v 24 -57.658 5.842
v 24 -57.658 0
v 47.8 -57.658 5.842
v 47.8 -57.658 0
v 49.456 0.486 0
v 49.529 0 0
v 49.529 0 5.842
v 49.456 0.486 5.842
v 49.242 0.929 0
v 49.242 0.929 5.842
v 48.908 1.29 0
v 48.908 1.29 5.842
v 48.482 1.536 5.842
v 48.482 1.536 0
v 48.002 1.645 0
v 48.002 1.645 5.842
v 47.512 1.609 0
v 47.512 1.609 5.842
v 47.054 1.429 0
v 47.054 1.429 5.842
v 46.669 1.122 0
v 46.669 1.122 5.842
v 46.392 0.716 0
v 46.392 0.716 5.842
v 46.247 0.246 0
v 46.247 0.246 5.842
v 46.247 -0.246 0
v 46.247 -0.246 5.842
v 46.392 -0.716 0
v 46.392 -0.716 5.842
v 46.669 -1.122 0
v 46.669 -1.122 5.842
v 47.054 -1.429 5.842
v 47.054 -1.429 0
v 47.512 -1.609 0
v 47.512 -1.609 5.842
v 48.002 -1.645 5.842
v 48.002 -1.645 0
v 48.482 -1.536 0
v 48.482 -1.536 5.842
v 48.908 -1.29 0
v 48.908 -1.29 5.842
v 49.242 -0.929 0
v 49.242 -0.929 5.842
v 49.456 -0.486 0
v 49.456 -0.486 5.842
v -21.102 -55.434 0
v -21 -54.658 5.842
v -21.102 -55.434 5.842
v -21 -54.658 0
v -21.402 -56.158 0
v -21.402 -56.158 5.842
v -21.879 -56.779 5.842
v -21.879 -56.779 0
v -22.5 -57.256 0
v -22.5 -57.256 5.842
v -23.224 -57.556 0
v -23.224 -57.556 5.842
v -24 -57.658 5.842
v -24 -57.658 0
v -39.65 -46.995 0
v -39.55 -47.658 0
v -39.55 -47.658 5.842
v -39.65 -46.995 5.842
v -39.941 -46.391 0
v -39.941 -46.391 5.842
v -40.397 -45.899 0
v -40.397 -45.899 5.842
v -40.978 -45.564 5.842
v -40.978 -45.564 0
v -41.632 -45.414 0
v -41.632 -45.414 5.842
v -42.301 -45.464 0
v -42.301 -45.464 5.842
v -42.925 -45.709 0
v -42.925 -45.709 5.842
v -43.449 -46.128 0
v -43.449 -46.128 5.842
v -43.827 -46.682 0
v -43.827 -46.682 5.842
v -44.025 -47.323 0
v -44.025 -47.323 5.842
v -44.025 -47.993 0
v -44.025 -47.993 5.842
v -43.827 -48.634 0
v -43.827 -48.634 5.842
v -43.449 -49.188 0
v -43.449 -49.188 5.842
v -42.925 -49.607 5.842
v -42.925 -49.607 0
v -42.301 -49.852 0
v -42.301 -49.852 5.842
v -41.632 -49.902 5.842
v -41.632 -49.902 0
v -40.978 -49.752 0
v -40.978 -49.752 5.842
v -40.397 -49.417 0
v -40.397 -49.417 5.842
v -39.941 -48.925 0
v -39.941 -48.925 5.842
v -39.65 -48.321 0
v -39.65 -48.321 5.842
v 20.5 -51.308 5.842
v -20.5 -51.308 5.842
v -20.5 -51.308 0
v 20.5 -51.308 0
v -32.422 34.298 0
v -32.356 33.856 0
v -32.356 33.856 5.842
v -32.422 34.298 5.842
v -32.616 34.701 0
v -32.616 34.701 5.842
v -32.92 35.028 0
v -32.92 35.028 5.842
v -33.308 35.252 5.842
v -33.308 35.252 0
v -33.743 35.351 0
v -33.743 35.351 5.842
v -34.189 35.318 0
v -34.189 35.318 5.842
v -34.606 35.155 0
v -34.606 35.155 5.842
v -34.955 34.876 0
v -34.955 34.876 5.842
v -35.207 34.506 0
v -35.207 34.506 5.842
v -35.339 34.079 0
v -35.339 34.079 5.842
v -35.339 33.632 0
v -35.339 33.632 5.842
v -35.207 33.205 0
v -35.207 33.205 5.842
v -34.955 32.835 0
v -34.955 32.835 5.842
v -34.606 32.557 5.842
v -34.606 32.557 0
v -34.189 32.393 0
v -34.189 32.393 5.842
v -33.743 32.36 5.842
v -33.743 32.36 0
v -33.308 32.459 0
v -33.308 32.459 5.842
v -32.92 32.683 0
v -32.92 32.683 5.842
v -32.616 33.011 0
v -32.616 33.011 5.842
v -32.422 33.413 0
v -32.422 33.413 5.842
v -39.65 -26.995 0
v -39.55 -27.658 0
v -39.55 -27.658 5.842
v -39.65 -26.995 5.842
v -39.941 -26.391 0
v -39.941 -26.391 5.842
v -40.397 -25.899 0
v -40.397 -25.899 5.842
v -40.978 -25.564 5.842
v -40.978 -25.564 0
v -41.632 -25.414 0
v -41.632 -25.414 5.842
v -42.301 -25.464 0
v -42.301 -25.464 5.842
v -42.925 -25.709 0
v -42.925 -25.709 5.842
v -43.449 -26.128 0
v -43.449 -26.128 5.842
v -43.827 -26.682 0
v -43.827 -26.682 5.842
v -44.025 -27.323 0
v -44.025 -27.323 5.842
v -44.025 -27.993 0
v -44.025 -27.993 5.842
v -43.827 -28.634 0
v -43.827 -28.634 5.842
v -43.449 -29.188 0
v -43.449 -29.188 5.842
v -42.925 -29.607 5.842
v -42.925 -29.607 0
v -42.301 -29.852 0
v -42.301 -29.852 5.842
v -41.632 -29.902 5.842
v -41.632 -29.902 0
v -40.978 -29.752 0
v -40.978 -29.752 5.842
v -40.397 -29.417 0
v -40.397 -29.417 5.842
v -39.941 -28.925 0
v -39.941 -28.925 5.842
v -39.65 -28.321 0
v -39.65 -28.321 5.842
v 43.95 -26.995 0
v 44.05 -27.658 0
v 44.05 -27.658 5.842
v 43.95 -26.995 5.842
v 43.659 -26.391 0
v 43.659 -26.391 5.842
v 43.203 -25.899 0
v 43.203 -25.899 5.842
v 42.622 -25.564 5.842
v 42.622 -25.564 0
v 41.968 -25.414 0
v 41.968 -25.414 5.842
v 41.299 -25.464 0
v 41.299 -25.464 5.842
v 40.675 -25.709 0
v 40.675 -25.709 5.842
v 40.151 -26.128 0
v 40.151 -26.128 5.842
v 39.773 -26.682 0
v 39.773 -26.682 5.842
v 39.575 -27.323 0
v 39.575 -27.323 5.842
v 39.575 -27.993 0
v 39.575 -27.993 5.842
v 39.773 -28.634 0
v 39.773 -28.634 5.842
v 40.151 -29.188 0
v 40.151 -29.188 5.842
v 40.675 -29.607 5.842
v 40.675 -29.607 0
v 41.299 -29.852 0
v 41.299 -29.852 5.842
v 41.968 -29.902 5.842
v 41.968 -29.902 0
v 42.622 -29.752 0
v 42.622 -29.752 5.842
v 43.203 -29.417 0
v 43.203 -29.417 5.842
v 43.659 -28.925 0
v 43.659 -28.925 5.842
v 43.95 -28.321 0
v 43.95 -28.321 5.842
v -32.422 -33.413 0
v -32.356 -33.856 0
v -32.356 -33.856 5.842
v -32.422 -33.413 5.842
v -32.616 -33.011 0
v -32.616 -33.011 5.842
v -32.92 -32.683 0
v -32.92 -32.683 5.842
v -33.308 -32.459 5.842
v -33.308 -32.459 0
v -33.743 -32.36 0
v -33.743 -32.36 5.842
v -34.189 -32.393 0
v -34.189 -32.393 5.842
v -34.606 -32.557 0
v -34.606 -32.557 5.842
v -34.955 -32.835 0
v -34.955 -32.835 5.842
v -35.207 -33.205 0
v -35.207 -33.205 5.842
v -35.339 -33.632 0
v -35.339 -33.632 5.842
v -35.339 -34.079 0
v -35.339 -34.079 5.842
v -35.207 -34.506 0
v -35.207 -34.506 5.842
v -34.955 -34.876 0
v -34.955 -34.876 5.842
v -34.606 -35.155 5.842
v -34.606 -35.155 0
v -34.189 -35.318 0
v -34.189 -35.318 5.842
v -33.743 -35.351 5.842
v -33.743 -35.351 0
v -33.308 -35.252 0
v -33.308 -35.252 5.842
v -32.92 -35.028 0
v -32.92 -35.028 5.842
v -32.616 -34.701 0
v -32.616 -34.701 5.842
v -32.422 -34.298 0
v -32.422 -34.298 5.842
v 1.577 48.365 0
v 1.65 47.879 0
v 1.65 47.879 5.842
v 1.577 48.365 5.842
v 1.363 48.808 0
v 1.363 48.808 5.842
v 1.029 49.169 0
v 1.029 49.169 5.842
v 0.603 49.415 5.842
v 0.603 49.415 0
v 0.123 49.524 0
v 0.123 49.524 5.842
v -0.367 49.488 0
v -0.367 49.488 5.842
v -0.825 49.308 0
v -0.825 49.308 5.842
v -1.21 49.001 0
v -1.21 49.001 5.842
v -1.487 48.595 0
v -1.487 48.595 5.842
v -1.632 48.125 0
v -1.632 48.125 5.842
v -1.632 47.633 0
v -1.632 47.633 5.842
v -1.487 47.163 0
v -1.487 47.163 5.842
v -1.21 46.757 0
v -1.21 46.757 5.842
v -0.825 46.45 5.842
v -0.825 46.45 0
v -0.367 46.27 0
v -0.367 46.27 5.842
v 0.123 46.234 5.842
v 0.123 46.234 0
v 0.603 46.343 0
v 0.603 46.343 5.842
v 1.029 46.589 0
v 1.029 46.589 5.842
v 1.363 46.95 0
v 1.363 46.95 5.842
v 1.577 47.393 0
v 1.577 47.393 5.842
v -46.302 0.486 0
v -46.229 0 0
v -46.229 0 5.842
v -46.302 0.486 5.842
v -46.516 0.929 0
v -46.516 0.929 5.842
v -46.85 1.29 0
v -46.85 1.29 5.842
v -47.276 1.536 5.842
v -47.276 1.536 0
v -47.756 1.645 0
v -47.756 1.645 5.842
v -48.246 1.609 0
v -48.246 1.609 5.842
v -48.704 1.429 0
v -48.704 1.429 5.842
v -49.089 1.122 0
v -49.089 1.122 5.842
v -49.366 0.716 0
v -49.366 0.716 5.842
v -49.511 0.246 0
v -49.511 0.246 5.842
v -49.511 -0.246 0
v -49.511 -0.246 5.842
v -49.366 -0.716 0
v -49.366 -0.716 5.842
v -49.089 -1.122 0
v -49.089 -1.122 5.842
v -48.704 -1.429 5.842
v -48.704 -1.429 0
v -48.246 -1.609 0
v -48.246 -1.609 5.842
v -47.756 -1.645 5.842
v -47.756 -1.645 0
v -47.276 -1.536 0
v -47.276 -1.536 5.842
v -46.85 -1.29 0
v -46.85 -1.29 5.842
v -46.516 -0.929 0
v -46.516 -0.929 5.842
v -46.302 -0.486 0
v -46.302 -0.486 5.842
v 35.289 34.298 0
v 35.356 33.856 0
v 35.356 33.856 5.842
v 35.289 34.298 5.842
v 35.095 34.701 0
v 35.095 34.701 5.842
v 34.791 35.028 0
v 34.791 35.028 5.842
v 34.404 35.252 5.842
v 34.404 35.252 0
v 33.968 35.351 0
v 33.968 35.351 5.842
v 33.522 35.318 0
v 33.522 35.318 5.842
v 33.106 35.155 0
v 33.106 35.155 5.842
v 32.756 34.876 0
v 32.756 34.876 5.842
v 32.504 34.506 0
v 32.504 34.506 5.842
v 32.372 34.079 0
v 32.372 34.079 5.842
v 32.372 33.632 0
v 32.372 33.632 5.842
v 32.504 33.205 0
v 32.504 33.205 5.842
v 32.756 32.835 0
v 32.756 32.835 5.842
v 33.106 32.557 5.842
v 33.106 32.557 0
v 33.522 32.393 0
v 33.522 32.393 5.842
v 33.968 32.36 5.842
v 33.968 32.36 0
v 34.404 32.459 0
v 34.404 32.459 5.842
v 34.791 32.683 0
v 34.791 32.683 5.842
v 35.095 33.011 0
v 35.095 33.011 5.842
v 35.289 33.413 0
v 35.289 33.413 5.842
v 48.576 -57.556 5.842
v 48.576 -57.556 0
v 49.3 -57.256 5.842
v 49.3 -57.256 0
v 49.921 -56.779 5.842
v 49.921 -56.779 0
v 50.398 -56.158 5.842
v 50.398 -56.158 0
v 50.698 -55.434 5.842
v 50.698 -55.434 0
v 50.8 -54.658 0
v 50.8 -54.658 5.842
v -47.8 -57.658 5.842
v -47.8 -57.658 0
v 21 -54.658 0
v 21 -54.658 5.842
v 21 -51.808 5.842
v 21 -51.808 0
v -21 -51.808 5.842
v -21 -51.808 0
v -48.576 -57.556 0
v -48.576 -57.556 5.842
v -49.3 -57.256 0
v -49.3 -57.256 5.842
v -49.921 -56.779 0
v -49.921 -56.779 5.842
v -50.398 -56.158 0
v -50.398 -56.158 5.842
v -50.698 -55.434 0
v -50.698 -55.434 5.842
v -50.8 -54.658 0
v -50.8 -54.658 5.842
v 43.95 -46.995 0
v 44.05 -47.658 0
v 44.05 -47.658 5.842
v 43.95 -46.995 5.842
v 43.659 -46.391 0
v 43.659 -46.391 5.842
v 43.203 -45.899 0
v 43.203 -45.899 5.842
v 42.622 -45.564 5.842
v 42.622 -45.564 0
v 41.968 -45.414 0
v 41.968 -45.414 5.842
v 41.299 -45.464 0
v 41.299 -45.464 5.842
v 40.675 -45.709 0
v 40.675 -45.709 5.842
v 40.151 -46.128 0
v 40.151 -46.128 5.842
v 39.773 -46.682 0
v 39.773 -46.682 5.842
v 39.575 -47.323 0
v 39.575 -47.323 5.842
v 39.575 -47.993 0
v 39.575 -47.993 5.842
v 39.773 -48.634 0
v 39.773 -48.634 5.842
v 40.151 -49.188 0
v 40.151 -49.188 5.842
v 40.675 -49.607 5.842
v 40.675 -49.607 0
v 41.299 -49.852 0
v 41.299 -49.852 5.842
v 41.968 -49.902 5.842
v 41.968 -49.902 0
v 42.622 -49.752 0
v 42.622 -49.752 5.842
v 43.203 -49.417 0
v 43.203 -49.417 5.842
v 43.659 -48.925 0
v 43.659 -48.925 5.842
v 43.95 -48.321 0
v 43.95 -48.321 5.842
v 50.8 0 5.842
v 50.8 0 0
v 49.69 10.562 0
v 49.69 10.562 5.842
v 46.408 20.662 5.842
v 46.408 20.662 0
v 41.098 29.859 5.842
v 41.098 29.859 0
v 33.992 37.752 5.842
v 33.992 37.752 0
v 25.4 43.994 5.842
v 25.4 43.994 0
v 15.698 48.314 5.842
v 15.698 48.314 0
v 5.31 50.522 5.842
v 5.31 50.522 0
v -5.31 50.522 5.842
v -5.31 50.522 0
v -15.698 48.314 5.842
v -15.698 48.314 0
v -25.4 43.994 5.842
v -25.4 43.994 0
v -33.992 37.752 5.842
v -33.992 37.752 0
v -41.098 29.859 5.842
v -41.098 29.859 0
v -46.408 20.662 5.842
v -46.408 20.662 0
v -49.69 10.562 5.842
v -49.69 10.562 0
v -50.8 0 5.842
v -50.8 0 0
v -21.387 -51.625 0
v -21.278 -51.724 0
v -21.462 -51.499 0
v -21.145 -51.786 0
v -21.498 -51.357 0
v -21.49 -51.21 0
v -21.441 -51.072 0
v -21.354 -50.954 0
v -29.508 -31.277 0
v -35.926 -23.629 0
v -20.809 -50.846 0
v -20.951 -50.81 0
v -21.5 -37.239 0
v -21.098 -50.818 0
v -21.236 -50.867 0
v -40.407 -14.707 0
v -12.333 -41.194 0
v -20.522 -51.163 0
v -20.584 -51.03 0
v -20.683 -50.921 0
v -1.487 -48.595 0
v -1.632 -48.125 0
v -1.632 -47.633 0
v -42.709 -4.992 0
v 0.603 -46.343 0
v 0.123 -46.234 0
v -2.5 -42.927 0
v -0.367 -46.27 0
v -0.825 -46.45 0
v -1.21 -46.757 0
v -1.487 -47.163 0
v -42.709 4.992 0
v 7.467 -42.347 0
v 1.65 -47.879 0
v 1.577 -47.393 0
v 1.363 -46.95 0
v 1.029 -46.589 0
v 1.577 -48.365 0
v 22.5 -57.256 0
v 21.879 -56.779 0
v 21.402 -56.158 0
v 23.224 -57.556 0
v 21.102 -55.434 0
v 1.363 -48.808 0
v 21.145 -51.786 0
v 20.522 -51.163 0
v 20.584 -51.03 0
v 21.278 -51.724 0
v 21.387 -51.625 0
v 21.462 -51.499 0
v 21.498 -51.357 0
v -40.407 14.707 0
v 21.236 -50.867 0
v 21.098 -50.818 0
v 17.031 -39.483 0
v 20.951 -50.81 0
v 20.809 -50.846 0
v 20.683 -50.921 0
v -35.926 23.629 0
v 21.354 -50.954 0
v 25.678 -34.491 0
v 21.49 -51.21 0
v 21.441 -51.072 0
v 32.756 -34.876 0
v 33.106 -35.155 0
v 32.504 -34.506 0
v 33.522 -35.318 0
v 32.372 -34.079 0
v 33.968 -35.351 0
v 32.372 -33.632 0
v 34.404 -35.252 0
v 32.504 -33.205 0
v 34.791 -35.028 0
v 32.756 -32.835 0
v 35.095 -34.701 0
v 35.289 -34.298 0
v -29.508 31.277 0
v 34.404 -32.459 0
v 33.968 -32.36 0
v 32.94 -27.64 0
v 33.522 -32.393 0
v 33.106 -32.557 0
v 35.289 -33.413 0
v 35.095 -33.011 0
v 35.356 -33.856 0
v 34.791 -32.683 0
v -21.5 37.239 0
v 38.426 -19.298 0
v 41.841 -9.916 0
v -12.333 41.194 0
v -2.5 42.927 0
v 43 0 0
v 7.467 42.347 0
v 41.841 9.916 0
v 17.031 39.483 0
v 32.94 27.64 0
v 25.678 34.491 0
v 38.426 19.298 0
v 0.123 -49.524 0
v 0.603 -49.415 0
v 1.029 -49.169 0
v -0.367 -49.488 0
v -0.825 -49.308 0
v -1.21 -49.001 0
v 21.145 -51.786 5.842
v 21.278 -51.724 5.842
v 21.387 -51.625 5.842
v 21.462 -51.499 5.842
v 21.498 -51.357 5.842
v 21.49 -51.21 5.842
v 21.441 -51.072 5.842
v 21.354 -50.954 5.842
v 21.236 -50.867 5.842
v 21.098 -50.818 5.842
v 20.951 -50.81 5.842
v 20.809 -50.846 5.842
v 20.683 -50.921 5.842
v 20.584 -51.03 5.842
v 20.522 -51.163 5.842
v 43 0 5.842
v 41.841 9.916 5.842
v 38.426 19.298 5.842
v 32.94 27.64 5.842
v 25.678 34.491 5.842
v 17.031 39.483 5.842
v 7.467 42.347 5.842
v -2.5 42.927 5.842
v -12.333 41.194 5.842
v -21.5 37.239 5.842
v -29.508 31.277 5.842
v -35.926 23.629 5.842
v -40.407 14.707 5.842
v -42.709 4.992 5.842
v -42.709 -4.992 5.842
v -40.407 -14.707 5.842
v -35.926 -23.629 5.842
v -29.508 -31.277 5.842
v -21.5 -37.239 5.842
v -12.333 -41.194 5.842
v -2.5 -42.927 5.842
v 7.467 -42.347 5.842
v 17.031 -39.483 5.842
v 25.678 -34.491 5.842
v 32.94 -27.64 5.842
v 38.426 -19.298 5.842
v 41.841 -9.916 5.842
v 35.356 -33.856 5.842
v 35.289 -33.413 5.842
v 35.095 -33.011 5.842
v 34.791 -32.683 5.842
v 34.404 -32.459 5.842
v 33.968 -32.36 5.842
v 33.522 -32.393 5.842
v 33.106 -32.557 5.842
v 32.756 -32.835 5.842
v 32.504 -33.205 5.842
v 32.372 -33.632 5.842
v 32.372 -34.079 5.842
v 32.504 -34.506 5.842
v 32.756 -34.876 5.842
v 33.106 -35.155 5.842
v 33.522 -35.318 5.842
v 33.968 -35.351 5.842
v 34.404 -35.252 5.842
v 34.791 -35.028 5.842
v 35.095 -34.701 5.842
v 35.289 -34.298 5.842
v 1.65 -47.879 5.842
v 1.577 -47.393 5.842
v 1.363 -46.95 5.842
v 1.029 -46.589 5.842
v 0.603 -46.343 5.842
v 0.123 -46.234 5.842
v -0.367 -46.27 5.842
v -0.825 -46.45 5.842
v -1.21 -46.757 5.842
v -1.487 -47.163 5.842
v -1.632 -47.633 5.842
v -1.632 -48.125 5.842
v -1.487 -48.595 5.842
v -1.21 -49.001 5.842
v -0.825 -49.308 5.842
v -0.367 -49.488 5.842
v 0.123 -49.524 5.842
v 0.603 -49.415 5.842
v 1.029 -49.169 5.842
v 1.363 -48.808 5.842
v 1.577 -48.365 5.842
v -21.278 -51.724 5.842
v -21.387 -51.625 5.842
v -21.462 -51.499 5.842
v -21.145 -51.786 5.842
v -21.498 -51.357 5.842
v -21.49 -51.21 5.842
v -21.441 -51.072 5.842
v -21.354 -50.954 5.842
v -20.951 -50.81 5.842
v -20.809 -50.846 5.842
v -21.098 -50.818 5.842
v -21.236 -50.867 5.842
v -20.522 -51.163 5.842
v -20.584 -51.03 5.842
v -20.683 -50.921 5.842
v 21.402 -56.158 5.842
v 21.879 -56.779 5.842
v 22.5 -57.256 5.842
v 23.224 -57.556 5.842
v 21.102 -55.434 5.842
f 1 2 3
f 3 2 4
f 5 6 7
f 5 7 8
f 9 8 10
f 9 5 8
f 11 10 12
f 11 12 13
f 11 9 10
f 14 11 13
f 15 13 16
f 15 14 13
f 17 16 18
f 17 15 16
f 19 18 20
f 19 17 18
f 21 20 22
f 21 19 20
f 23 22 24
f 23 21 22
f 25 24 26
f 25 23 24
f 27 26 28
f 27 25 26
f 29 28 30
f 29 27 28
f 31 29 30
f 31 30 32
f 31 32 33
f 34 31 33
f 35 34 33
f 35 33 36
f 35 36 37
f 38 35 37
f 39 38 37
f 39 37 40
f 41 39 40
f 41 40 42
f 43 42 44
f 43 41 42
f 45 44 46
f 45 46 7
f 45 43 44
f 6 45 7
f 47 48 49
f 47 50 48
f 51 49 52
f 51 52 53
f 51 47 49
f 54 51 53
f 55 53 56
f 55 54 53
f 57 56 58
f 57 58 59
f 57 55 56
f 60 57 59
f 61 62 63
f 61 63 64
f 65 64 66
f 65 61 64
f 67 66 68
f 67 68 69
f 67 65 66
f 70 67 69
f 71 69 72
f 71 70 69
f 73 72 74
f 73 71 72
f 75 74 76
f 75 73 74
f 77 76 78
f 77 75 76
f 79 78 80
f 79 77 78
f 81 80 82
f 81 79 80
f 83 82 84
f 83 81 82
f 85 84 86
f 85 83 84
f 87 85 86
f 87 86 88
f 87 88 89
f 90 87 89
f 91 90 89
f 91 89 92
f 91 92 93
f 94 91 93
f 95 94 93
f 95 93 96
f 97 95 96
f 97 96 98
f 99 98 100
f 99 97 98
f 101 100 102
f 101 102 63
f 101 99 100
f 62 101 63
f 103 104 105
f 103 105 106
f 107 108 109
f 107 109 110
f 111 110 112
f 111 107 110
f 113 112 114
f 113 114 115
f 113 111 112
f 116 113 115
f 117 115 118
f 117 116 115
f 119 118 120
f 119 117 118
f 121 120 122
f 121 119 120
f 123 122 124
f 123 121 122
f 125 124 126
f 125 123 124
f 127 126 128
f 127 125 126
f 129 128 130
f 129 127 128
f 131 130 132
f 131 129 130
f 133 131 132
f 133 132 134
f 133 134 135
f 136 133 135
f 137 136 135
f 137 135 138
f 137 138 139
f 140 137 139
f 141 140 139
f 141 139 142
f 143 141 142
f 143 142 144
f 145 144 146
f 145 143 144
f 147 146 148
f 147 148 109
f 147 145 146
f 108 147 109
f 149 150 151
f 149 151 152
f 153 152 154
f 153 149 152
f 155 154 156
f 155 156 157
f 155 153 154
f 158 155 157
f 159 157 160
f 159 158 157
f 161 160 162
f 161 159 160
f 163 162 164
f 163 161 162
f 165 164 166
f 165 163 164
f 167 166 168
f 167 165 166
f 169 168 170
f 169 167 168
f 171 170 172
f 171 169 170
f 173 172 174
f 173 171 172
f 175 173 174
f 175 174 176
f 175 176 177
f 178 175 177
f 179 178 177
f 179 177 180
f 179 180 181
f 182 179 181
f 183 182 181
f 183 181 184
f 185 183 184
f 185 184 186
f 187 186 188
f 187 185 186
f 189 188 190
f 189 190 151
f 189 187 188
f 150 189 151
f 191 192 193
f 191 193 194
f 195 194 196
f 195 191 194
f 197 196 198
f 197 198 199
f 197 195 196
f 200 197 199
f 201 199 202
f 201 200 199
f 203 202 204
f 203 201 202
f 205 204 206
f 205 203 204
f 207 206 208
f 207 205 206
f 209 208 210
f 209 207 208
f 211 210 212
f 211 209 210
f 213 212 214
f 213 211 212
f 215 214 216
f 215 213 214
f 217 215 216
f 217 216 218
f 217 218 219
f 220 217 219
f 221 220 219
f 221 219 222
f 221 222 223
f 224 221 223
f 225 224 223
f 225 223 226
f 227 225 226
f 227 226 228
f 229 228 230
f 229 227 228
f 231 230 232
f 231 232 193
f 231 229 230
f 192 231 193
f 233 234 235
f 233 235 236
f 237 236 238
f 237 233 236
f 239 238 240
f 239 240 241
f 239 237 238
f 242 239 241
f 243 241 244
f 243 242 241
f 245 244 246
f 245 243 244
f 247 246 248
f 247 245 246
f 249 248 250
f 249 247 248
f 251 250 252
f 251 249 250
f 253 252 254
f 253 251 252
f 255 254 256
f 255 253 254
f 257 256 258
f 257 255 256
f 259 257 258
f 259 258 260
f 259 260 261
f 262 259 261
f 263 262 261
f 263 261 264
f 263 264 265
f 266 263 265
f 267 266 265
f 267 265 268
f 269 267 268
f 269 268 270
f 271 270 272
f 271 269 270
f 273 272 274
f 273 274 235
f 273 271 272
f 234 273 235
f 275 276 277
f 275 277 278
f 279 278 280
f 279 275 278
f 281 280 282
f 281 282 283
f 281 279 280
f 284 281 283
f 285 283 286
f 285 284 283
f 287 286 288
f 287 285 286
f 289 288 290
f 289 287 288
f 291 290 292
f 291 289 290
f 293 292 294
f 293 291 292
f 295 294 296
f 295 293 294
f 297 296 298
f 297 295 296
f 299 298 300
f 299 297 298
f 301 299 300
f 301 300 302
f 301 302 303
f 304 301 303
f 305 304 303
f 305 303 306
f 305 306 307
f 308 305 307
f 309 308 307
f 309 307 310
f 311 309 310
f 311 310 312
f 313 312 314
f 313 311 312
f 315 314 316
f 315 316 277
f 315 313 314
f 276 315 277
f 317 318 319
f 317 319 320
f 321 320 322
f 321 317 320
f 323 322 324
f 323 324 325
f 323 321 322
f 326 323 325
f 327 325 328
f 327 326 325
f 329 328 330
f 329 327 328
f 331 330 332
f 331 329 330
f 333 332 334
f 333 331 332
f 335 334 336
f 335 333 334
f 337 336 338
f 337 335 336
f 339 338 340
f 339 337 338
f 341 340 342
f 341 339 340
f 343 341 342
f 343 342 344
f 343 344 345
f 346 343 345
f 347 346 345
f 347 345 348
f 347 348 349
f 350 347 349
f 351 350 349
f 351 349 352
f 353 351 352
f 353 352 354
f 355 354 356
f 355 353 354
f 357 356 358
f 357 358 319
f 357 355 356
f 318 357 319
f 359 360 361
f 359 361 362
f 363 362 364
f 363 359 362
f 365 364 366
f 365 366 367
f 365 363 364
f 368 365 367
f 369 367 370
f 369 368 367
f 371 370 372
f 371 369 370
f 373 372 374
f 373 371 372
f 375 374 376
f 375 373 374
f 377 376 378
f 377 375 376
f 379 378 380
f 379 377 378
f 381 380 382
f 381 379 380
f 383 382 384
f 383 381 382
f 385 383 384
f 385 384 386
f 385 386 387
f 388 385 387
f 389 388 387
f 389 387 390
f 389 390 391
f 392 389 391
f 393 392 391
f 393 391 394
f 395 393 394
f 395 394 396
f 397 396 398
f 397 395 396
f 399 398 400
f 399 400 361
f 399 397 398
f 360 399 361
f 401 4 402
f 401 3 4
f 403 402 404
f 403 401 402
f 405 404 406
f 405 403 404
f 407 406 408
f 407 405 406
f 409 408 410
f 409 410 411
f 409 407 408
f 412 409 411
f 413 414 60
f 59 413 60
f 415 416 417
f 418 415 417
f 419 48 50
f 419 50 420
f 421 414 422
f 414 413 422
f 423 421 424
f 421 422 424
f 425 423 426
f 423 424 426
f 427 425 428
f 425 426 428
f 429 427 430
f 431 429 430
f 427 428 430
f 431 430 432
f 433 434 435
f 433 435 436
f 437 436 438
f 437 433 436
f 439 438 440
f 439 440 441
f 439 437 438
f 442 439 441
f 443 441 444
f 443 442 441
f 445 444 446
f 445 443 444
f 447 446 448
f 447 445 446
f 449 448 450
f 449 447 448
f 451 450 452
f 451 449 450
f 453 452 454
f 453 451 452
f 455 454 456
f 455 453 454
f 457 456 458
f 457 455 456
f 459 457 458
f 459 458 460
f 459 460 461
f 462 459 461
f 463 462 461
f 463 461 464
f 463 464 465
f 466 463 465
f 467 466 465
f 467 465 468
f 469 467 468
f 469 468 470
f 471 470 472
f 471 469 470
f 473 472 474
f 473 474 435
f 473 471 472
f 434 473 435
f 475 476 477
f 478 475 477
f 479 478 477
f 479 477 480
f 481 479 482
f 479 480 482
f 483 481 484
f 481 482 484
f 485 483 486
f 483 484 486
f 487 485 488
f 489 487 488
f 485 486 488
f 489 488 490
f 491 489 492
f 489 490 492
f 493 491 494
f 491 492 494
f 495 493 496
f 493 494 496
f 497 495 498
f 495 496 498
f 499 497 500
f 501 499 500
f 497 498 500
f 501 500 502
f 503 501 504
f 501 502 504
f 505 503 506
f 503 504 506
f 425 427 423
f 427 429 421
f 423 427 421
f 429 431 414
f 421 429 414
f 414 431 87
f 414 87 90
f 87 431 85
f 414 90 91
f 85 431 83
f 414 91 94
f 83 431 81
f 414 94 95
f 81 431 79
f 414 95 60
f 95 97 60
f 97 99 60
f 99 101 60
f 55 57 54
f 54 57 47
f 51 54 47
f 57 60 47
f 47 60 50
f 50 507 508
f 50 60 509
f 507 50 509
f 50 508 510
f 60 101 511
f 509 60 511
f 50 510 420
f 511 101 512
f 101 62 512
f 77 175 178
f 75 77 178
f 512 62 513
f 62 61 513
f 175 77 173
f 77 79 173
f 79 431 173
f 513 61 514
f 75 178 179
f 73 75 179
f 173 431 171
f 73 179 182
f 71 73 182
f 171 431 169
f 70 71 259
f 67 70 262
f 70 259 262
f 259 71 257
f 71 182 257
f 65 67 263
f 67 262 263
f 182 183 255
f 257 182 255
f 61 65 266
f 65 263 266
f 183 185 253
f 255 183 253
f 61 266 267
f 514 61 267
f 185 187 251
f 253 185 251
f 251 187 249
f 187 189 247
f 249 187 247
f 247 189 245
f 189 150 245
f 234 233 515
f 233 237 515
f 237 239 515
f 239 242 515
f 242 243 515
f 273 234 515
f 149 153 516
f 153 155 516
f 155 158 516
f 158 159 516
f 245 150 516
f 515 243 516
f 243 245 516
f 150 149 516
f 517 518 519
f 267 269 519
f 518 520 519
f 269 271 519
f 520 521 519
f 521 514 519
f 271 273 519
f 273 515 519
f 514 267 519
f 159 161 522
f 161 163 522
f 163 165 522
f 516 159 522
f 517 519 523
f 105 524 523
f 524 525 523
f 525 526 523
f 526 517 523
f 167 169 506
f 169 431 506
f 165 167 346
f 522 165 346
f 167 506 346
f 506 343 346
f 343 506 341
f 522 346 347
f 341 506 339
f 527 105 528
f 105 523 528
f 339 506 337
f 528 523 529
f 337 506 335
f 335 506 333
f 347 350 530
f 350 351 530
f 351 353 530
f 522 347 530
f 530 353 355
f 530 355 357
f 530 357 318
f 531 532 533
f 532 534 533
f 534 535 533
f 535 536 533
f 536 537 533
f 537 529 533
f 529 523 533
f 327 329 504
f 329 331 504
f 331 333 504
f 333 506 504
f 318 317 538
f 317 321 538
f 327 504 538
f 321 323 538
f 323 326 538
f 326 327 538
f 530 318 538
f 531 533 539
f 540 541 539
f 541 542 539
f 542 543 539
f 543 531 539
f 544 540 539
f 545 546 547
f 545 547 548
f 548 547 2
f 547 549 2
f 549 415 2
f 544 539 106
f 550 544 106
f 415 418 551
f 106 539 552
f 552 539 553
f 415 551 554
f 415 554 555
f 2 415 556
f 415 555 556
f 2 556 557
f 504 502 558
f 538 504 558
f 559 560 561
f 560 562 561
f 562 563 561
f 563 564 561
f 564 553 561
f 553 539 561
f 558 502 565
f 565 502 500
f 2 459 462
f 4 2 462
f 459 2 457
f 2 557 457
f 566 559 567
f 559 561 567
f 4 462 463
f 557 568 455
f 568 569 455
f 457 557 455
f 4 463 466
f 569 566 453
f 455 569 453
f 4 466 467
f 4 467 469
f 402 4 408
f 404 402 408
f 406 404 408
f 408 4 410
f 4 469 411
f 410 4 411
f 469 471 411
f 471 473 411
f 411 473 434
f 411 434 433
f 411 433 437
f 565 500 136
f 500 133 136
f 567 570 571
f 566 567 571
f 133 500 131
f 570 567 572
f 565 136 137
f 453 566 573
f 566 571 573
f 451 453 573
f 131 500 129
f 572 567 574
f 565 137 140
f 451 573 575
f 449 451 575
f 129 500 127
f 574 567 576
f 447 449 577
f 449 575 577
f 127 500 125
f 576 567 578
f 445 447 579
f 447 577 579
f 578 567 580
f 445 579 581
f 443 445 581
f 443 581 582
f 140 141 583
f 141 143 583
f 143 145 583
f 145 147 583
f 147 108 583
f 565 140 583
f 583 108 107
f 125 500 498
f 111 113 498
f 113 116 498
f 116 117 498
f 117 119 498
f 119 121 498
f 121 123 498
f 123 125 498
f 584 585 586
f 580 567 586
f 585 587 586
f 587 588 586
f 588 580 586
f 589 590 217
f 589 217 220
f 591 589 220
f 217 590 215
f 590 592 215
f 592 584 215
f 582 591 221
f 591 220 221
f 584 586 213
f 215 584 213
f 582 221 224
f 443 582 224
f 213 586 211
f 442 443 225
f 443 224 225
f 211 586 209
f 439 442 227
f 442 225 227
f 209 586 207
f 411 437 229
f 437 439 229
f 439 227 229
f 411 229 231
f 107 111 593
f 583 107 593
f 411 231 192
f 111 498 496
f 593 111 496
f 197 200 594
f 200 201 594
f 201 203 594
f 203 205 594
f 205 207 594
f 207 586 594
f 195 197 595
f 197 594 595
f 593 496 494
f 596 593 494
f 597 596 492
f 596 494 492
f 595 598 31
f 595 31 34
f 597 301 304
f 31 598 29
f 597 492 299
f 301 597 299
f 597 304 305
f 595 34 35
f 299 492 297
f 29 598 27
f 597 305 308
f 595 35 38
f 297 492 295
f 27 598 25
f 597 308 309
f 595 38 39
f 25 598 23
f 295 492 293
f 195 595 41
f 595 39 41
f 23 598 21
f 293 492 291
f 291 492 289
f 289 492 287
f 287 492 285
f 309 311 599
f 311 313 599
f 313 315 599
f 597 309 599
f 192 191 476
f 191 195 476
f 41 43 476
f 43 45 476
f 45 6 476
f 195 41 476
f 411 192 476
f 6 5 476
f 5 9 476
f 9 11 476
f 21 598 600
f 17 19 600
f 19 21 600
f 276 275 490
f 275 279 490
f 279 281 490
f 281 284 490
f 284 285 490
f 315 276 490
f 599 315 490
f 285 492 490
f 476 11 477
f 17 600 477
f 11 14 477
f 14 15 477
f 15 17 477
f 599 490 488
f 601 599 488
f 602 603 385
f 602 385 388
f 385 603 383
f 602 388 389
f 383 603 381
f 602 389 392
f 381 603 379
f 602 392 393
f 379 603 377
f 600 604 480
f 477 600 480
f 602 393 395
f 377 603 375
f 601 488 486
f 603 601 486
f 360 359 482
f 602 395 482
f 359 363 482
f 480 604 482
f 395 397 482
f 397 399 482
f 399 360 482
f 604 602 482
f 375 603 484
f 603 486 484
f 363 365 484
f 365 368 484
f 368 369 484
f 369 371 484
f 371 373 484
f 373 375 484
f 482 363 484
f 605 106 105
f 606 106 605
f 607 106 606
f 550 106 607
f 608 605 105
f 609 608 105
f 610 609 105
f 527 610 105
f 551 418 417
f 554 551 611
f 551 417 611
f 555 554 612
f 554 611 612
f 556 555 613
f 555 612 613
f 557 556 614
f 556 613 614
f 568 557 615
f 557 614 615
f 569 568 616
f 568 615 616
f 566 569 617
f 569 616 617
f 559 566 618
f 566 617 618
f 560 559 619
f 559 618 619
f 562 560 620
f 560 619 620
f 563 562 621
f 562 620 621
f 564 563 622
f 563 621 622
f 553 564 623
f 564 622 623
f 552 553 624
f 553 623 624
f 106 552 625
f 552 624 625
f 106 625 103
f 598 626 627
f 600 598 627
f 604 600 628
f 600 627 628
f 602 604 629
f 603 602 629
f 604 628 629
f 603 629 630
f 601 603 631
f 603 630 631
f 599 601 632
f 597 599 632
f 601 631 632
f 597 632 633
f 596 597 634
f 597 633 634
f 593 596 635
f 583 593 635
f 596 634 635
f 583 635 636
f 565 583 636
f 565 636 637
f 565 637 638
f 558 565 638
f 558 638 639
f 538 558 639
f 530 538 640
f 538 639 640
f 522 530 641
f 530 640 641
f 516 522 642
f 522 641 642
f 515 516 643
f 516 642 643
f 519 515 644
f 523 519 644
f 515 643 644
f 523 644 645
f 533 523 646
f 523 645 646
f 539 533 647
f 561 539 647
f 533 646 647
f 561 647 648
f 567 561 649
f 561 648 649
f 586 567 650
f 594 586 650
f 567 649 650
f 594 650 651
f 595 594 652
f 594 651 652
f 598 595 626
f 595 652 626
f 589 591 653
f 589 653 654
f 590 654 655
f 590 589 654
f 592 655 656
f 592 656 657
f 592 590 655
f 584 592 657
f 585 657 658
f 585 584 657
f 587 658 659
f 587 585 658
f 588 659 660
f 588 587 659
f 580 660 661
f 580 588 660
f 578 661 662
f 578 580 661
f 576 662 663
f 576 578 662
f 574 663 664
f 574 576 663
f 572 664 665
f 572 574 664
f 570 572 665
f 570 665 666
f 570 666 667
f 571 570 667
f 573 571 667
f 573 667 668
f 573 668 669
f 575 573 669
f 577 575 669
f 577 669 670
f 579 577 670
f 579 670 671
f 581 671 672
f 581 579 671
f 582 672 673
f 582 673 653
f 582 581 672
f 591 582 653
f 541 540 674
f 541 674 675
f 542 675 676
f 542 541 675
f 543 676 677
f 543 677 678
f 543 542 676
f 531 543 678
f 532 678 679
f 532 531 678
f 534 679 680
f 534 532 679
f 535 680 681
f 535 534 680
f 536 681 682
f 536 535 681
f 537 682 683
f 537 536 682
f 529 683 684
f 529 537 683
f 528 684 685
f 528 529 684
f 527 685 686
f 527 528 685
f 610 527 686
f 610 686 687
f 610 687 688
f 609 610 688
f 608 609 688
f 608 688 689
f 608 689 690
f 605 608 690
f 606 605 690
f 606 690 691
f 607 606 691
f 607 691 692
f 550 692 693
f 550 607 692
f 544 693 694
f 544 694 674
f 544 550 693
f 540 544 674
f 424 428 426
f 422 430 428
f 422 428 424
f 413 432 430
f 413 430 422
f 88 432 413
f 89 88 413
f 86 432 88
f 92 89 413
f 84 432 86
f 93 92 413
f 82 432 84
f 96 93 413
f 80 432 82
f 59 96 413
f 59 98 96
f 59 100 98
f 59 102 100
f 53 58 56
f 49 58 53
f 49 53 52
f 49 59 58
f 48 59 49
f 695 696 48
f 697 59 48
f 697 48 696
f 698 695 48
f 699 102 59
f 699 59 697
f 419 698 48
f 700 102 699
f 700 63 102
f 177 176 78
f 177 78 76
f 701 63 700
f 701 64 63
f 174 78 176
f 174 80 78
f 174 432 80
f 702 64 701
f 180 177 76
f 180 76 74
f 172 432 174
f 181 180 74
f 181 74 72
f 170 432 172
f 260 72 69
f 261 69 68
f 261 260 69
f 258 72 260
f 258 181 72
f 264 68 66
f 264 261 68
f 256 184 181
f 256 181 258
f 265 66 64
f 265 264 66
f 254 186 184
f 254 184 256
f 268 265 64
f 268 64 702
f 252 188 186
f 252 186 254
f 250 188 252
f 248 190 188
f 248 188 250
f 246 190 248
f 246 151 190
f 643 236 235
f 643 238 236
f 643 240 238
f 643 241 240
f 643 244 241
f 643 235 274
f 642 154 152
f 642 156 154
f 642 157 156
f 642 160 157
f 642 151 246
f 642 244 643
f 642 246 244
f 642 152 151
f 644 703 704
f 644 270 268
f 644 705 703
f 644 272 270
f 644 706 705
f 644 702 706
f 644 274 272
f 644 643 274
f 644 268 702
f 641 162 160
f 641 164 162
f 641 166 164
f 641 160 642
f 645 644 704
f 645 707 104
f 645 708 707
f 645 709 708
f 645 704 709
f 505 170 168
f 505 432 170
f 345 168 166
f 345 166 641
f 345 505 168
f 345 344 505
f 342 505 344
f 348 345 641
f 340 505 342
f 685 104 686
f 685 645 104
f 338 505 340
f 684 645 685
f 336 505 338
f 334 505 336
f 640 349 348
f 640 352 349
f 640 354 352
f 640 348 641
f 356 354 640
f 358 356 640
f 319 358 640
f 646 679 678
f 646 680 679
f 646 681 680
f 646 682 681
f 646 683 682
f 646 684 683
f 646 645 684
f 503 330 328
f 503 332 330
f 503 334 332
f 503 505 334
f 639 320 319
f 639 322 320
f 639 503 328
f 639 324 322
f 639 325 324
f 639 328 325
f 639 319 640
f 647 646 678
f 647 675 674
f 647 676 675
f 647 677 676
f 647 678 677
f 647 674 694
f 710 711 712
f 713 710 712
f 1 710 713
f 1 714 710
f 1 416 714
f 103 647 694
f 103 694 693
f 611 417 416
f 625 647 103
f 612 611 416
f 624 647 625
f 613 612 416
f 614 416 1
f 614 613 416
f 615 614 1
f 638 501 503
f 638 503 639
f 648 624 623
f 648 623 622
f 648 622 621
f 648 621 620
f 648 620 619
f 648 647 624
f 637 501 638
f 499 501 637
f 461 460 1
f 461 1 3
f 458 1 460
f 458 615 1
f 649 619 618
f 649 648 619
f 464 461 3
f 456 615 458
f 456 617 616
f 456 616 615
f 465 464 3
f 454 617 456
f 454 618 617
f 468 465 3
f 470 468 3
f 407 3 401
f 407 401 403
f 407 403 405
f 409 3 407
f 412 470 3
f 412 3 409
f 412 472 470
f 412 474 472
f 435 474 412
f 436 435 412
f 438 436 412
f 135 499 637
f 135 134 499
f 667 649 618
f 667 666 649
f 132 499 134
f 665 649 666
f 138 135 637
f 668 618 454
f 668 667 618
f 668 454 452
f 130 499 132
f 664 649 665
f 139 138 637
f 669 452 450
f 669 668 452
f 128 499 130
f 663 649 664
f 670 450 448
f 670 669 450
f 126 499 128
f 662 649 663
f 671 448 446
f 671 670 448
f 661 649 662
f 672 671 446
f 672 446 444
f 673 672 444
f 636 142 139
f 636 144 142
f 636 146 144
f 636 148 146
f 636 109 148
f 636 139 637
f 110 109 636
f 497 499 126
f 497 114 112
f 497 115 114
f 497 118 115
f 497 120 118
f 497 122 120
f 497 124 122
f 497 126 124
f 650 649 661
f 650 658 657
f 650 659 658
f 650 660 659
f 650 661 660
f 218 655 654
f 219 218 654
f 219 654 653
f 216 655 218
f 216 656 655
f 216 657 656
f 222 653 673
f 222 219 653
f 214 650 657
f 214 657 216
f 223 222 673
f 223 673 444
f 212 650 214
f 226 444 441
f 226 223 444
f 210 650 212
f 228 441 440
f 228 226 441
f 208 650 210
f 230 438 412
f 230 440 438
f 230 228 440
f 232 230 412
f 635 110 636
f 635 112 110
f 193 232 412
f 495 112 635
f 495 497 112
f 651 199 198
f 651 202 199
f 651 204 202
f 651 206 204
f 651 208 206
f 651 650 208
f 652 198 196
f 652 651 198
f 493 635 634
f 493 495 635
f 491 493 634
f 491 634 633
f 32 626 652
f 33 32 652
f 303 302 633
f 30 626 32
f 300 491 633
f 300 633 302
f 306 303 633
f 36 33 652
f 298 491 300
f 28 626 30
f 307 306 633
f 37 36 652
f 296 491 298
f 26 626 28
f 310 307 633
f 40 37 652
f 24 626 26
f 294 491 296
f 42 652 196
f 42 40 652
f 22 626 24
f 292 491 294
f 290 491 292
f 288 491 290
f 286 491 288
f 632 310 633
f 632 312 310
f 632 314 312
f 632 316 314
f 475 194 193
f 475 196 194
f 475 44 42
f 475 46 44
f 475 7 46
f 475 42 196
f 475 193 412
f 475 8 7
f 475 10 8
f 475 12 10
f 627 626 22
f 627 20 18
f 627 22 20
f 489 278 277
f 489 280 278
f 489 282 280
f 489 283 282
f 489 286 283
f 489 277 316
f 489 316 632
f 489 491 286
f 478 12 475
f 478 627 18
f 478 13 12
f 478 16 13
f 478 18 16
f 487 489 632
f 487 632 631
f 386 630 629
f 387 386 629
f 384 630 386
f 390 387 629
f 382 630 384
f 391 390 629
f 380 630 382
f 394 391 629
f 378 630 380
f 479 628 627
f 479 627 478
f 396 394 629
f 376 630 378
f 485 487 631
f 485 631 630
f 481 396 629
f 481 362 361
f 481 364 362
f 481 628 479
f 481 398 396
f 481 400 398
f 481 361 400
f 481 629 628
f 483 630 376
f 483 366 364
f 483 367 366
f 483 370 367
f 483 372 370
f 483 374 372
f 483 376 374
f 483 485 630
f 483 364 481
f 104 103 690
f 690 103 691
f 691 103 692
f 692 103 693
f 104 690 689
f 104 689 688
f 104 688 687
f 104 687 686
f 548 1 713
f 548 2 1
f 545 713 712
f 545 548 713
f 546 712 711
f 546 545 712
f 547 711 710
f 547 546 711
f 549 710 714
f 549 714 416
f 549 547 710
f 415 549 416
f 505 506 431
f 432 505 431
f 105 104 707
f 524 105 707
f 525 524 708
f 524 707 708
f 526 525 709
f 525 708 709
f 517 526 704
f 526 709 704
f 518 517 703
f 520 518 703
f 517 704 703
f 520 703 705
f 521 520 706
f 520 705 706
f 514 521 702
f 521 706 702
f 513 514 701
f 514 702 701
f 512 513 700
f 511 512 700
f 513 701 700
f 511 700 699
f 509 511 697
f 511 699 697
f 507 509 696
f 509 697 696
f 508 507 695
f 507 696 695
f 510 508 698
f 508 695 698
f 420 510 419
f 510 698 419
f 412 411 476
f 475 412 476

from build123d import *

# Parameters (mm, degrees)
SKETCH1_R           = 2.25
SKETCH1_R_2         = 44.958
SKETCH1_R_3         = 1.65
SKETCH1_R_4         = 1.5
BOSS_EXTRUDE1_DEPTH = 5.842
SKETCH2_R           = 44.958
SKETCH2_R_2         = 43
BOSS_EXTRUDE2_DEPTH = 5.842
SKETCH3_W           = 42
SKETCH3_H           = 6.35
CUT_EXTRUDE1_DEPTH  = 78.066295668
SKETCH4_R           = 0.5
CUT_EXTRUDE2_DEPTH  = 78.066295668
FILLET1_R           = 3


with BuildPart() as part:
    # Sketch1 → Boss-Extrude1 (new body)
    with BuildSketch(Plane.XY):
        with BuildLine():
            Line((-50.8, 0), (-50.8, -57.658))
            Line((-50.8, -57.658), (50.8, -57.658))
            Line((50.8, -57.658), (50.8, 0))
            ThreePointArc((50.8, 0), (0, 50.8), (-50.8, 0))
        make_face()
        with Locations((41.8, -47.658)):
            Circle(SKETCH1_R, mode=Mode.SUBTRACT)
        Circle(SKETCH1_R_2, mode=Mode.SUBTRACT)
        with Locations((-47.879, 0)):
            Circle(SKETCH1_R_3, mode=Mode.SUBTRACT)
        with Locations((0, 47.879)):
            Circle(SKETCH1_R_3, mode=Mode.SUBTRACT)
        with Locations((41.8, -27.658)):
            Circle(SKETCH1_R, mode=Mode.SUBTRACT)
        with Locations((47.879, 0)):
            Circle(SKETCH1_R_3, mode=Mode.SUBTRACT)
        with Locations((0, -47.879)):
            Circle(SKETCH1_R_3, mode=Mode.SUBTRACT)
        with Locations((-33.855565576, 33.855565576)):
            Circle(SKETCH1_R_4, mode=Mode.SUBTRACT)
        with Locations((33.855565576, 33.855565576)):
            Circle(SKETCH1_R_4, mode=Mode.SUBTRACT)
        with Locations((33.855565576, -33.855565576)):
            Circle(SKETCH1_R_4, mode=Mode.SUBTRACT)
        with Locations((-33.855565576, -33.855565576)):
            Circle(SKETCH1_R_4, mode=Mode.SUBTRACT)
        with Locations((-41.8, -27.658)):
            Circle(SKETCH1_R, mode=Mode.SUBTRACT)
        with Locations((-41.8, -47.658)):
            Circle(SKETCH1_R, mode=Mode.SUBTRACT)
    extrude(amount=BOSS_EXTRUDE1_DEPTH)

    # Sketch2 → Boss-Extrude2 (add, through all)
    with BuildSketch(Plane.XY.offset(5.842)):
        Circle(SKETCH2_R)
        Circle(SKETCH2_R_2, mode=Mode.SUBTRACT)
    extrude(amount=-BOSS_EXTRUDE2_DEPTH)

    # Sketch3 → Cut-Extrude1 (cut, through all)
    with BuildSketch(Plane.XY.offset(5.842)):
        with Locations((0, -54.483)):
            Rectangle(SKETCH3_W, SKETCH3_H)
    extrude(amount=-CUT_EXTRUDE1_DEPTH, mode=Mode.SUBTRACT)

    # Sketch4 → Cut-Extrude2 (cut, through all)
    with BuildSketch(Plane.XY.offset(5.842)):
        with Locations((-21, -51.308)):
            Circle(SKETCH4_R)
        with Locations((21, -51.308)):
            Circle(SKETCH4_R)
    extrude(amount=-CUT_EXTRUDE2_DEPTH, mode=Mode.SUBTRACT)

    # Fillet1
    fillet1_edges = [part.edges().sort_by_distance(p)[0] for p in [
        (50.8, -57.658, 2.921),
        (-50.8, -57.658, 2.921),
        (-21, -57.658, 2.921),
        (21, -57.658, 2.921),
    ]]
    fillet(fillet1_edges, radius=FILLET1_R)


solid = part.part
